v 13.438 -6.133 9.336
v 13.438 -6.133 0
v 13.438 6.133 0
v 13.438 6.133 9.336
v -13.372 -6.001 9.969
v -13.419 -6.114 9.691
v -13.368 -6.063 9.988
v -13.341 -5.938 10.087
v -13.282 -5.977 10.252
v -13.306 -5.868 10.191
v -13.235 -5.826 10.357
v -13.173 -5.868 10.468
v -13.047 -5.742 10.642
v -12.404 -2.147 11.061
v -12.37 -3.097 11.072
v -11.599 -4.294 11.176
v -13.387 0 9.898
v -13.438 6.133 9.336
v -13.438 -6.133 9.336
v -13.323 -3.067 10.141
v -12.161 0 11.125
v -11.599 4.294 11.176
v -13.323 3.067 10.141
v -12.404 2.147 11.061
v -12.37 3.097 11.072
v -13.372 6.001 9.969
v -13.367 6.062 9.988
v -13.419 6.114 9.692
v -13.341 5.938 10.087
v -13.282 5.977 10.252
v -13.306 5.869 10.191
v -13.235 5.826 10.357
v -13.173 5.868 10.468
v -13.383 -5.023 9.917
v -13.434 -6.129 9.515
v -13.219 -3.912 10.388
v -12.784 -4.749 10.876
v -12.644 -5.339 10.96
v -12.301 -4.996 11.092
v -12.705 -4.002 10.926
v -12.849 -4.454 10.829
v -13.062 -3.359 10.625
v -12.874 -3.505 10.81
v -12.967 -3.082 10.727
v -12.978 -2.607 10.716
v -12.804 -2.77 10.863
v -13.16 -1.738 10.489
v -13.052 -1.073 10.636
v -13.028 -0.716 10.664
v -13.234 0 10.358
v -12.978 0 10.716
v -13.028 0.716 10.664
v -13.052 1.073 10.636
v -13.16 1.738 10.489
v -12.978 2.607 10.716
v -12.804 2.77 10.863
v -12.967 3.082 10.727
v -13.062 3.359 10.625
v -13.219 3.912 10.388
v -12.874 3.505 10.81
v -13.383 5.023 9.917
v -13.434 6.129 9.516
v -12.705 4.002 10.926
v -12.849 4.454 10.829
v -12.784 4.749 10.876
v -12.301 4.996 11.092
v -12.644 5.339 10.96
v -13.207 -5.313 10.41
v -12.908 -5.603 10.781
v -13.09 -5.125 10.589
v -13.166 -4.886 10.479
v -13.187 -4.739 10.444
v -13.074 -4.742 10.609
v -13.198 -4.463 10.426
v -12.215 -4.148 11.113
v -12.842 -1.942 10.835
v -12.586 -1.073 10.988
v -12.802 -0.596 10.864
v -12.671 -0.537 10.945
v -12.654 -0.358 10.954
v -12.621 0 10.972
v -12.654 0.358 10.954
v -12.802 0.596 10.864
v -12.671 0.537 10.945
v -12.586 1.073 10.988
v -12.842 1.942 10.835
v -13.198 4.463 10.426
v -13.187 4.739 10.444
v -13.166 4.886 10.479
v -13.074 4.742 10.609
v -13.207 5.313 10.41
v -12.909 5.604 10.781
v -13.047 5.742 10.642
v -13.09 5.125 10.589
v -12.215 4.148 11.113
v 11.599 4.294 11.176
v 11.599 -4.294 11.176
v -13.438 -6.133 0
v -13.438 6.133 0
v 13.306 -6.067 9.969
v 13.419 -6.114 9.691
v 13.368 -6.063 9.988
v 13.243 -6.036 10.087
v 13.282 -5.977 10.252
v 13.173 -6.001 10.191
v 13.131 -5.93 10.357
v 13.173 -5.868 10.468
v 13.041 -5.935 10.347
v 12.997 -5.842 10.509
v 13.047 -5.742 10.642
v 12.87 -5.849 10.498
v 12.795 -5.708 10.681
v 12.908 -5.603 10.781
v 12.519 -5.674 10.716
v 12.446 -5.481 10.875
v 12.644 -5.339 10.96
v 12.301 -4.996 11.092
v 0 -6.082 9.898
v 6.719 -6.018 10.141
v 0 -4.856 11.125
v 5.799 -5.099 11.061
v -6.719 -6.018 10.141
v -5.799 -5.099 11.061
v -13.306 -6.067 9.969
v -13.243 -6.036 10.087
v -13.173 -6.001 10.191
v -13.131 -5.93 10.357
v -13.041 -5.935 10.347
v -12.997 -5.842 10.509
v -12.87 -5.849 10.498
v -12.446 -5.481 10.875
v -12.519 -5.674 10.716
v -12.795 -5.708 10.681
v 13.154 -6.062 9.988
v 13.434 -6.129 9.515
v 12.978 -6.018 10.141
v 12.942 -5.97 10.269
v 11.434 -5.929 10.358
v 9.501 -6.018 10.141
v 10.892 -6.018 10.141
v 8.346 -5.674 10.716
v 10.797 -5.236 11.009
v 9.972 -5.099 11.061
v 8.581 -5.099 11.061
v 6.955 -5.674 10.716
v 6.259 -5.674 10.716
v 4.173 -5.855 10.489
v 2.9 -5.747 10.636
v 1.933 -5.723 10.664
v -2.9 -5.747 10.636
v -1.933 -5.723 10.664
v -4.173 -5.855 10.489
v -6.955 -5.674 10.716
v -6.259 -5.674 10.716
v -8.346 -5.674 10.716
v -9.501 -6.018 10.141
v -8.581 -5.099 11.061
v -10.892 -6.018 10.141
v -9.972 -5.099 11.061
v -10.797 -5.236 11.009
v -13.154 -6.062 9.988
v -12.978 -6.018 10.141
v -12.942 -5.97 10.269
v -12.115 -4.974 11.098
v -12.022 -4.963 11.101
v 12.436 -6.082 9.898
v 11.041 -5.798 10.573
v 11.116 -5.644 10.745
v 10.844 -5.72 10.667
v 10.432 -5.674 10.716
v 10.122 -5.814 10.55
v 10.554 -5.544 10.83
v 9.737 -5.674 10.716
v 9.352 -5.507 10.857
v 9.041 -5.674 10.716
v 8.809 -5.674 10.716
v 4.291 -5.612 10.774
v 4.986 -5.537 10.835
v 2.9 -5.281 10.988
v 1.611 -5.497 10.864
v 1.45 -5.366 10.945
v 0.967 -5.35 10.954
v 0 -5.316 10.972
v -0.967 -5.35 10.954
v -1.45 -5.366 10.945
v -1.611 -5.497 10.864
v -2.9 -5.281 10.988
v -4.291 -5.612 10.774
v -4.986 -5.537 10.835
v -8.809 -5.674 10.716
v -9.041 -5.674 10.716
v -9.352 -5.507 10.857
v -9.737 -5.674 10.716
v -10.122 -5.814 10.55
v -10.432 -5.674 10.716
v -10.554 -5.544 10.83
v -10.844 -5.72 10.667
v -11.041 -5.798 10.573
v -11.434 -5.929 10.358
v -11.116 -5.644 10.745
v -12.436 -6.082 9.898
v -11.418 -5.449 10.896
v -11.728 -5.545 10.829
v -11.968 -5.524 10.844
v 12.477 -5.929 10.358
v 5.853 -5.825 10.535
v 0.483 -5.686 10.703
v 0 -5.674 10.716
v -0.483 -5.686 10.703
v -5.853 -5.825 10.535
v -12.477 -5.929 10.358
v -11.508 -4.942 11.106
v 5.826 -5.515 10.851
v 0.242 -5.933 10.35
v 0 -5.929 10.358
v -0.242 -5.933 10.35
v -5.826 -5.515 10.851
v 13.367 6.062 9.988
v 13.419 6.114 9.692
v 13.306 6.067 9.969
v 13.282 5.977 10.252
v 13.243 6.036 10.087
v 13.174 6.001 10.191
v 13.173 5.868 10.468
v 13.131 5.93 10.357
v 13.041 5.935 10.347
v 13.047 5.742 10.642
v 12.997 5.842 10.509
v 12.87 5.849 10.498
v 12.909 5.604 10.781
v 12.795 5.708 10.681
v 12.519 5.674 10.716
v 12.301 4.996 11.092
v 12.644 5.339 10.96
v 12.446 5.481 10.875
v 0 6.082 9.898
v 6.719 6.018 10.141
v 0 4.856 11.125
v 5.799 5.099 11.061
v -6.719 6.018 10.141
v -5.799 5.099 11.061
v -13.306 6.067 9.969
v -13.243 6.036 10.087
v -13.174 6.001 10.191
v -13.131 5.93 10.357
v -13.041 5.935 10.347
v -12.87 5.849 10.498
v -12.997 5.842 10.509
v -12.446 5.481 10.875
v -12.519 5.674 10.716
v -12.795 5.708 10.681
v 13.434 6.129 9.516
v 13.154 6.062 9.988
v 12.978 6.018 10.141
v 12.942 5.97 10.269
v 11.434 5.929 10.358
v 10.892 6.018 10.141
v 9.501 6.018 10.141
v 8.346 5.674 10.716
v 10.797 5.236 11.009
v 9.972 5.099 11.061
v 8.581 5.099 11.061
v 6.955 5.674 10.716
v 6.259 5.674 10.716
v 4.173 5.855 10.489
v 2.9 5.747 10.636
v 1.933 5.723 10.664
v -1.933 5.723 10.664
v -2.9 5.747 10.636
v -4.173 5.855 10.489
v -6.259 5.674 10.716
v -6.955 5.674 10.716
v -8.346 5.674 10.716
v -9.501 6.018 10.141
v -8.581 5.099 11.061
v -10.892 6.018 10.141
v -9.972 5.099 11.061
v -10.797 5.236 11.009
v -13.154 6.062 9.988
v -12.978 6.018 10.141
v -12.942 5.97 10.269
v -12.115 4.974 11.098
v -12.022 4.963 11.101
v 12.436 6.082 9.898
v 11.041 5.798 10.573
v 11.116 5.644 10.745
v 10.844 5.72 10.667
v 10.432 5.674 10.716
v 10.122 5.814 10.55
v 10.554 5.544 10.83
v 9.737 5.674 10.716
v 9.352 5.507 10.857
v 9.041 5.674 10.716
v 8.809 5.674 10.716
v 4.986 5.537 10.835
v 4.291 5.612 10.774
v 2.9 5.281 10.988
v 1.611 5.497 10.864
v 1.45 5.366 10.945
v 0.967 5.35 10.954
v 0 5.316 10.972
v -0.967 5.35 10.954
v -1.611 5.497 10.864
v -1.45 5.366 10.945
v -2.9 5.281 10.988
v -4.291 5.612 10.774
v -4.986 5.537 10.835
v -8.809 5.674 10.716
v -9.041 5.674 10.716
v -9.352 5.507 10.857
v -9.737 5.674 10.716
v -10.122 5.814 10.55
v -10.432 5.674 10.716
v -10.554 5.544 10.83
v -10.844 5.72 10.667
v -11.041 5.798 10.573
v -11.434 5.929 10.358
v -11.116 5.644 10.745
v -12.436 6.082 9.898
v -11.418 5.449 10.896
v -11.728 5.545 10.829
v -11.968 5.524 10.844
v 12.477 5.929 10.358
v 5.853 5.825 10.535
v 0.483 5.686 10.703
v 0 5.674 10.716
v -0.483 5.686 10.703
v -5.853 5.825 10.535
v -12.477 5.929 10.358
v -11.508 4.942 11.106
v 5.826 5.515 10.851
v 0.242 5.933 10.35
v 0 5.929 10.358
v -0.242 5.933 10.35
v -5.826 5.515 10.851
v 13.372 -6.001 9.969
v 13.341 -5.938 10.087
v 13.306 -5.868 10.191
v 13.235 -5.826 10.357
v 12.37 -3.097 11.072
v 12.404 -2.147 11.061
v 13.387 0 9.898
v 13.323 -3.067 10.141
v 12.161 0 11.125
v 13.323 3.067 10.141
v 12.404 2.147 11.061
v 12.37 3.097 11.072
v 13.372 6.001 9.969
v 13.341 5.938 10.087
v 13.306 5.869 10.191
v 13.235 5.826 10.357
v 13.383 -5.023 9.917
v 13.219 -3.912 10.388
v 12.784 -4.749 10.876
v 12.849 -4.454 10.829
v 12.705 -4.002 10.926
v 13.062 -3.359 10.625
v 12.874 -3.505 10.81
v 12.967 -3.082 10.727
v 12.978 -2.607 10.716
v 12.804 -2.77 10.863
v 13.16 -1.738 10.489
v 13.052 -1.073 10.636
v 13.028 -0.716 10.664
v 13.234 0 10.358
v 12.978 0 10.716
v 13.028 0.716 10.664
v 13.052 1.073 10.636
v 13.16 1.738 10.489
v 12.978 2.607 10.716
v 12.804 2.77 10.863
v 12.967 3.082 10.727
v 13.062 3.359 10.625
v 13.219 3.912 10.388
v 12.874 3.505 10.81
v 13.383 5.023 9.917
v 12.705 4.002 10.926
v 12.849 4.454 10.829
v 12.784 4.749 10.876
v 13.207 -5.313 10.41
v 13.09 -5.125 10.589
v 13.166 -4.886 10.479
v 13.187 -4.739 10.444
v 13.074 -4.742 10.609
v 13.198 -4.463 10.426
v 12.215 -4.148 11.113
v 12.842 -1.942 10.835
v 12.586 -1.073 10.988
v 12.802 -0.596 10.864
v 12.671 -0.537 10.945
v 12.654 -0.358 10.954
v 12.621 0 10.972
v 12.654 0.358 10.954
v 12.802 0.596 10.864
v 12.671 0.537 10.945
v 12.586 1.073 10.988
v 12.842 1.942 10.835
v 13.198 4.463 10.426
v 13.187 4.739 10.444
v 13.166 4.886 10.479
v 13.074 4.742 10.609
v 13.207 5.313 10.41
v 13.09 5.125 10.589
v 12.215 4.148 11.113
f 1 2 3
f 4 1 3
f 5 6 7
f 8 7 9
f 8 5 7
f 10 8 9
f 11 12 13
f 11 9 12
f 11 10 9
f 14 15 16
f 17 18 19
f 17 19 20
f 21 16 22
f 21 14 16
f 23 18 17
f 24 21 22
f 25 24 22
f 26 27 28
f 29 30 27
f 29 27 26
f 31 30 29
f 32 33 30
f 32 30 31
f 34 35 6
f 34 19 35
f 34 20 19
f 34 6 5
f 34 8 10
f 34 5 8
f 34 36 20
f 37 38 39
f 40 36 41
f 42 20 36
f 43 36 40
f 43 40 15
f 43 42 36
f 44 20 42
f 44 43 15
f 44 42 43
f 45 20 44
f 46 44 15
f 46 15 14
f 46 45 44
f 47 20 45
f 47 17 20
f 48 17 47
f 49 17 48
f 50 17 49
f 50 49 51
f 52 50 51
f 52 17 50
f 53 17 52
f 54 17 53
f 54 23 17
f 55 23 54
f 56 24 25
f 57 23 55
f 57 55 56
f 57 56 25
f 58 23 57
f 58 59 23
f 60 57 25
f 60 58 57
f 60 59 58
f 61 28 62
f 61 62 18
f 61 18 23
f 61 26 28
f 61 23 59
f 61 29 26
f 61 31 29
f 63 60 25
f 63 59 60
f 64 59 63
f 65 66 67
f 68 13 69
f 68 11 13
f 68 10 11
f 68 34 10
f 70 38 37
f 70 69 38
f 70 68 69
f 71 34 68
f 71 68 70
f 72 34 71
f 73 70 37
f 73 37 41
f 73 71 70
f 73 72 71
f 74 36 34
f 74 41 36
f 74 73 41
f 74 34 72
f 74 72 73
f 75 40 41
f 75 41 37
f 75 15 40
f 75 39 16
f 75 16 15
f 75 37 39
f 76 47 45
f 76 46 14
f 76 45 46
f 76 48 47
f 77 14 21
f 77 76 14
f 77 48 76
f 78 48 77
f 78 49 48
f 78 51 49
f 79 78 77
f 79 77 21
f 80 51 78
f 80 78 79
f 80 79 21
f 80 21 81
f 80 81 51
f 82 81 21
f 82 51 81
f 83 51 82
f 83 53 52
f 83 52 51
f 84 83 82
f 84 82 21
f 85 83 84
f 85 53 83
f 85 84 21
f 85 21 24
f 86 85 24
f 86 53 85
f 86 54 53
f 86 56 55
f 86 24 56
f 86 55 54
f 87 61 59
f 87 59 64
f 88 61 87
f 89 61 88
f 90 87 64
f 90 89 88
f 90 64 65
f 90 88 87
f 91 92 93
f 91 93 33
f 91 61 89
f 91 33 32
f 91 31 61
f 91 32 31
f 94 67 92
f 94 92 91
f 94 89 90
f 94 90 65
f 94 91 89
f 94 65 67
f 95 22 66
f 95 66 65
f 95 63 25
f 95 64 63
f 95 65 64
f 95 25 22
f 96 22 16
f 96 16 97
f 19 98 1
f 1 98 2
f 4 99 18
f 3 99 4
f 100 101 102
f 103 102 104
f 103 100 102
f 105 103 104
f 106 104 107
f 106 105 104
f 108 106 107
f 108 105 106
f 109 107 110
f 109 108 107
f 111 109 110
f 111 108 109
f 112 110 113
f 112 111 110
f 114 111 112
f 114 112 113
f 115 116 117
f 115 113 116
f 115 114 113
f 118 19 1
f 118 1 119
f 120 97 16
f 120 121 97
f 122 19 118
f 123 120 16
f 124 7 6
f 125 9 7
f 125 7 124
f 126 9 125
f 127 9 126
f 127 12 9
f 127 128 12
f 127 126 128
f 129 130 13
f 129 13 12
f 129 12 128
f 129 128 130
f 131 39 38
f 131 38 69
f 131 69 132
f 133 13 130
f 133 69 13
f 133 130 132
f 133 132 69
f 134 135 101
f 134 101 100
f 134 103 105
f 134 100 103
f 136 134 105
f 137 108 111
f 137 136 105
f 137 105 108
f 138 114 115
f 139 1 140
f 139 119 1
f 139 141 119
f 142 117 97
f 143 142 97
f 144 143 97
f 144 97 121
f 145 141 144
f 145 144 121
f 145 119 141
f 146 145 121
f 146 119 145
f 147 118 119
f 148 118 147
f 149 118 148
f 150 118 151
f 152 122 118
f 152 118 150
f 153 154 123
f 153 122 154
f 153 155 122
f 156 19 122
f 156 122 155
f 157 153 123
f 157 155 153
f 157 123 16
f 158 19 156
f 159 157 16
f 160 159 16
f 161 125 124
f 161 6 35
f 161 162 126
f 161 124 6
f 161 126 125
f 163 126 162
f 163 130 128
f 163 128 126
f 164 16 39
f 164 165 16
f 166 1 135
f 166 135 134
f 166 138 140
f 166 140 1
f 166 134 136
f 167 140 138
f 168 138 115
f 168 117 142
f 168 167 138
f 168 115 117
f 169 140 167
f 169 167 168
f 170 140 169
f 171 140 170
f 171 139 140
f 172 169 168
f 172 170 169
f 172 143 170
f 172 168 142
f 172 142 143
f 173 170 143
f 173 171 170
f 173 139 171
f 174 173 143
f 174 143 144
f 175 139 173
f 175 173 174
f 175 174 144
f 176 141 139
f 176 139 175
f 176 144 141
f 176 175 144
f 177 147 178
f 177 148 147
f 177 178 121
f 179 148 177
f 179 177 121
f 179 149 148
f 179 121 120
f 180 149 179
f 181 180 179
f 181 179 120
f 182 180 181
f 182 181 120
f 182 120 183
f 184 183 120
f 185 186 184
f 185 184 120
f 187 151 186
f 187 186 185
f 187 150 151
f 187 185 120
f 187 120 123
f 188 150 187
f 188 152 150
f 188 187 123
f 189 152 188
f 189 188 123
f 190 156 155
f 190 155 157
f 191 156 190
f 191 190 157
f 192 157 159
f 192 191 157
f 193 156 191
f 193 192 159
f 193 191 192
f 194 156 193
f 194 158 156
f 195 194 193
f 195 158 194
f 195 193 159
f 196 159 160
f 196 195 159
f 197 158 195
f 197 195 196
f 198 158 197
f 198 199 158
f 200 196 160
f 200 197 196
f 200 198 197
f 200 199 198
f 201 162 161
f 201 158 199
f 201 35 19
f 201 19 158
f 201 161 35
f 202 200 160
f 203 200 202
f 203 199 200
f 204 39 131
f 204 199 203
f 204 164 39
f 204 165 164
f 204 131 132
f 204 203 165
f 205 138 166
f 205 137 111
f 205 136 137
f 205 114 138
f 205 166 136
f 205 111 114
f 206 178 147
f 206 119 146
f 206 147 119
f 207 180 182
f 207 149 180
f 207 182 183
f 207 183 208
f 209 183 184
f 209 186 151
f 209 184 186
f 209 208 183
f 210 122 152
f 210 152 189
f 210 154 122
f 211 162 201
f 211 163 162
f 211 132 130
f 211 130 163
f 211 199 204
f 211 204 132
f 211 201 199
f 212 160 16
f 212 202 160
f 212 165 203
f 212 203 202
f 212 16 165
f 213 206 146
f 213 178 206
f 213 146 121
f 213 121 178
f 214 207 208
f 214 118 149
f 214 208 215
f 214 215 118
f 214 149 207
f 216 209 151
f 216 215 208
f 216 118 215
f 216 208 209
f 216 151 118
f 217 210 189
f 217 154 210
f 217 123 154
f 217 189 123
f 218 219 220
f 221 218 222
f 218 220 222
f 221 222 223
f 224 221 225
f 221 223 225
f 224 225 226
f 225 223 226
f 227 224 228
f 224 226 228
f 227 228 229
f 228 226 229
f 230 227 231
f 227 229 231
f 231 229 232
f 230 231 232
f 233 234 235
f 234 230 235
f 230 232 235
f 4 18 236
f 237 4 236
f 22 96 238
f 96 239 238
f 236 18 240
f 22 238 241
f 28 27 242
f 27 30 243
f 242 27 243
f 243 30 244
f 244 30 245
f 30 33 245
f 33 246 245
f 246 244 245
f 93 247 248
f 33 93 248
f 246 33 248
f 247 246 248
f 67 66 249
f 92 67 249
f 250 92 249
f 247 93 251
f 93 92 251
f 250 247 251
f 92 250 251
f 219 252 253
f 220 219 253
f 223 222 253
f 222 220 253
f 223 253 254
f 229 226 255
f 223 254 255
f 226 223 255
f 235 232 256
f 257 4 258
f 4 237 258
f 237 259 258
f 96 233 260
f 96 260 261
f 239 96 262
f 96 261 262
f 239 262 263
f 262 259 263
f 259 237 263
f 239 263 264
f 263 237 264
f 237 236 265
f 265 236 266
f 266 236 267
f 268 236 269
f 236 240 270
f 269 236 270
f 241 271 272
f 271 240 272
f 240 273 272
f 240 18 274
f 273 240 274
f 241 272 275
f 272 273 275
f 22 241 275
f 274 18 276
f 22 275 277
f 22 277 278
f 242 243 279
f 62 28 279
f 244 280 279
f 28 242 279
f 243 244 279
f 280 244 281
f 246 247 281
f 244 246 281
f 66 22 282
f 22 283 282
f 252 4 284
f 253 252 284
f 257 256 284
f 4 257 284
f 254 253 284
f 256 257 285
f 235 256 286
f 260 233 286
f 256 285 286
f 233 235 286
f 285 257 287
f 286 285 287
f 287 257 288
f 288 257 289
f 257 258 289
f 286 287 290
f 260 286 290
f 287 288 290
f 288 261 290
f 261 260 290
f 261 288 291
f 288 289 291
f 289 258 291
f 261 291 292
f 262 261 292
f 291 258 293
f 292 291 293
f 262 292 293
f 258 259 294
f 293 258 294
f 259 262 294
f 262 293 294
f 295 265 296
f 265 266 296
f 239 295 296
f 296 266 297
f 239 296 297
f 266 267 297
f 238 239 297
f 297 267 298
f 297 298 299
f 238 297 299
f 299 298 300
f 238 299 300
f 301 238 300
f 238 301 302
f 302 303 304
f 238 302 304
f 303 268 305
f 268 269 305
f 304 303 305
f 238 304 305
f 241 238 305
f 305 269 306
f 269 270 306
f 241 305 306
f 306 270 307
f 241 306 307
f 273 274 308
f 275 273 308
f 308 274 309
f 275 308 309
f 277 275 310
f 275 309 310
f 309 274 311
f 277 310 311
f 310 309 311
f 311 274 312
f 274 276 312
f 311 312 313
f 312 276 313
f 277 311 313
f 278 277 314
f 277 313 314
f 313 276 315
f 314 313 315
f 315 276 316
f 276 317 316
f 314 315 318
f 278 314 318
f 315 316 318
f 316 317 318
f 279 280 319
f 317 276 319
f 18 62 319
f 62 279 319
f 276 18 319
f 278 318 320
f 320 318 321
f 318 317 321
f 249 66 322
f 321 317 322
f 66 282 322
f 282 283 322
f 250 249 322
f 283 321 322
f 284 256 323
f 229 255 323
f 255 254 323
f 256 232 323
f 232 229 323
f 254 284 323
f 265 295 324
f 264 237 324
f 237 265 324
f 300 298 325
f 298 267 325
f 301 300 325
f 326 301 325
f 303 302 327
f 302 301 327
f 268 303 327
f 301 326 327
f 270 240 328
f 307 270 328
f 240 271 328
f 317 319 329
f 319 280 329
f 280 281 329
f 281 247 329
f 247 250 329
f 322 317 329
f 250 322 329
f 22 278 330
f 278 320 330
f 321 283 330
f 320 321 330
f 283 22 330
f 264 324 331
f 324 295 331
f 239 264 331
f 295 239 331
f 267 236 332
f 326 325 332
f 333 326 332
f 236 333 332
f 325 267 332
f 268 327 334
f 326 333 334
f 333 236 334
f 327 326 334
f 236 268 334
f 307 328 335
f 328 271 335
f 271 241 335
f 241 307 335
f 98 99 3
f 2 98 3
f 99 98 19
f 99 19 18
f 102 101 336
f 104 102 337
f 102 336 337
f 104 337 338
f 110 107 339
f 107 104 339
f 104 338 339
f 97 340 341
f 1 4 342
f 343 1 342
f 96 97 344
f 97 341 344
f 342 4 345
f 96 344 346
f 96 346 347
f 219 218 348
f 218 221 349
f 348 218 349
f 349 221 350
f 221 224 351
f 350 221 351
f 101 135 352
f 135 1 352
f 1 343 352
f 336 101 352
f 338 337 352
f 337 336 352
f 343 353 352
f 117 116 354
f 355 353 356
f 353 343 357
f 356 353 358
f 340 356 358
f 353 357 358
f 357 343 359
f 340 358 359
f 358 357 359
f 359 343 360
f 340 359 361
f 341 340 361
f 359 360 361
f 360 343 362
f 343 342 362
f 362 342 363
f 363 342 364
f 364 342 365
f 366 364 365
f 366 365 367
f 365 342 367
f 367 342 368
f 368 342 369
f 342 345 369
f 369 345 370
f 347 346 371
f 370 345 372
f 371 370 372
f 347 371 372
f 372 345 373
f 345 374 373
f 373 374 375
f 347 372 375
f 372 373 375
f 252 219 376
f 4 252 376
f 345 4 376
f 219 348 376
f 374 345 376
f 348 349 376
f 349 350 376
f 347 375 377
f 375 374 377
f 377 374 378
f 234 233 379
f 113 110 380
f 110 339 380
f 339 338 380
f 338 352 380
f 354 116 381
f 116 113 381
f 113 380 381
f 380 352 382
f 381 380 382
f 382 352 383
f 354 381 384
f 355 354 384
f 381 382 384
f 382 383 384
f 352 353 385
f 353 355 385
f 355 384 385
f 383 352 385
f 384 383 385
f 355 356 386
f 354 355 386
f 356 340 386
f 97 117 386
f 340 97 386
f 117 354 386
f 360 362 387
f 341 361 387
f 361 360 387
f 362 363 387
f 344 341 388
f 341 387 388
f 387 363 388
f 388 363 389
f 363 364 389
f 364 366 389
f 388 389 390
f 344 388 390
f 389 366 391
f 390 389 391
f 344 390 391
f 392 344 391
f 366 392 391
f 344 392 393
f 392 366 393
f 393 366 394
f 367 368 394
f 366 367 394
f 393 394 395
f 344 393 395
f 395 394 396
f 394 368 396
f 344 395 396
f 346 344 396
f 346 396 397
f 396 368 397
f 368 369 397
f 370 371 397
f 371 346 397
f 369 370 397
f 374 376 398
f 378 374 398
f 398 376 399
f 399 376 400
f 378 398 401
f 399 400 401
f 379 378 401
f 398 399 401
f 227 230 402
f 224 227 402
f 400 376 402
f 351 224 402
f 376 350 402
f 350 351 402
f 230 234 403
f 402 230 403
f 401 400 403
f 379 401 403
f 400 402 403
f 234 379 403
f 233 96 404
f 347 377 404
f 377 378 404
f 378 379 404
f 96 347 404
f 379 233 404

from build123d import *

# Parameters (mm, degrees)
F0_W        = 26.8767457455
F0_H        = 12.2668221593
F1_DEPTH    = 11.176
F2_T1_DEPTH = 21.4649758319
F2_T3_DEPTH = 36.0748994182


# Not quite as in the source:
# - a fillet or chamfer that OpenCascade refuses, or shapes differently, is made with other operations: its cross-section is extruded or revolved along the edge and cut away or added


with BuildPart() as f1:
    # F0 (on Top) → F1 (new body)
    with BuildSketch(Plane.XY):
        Rectangle(F0_W, F0_H)
    extrude(amount=F1_DEPTH)

    # F2: fillet of radius 1.8396307345 on 4 edges, made by hand

    # F2_s2 → F2_t1 (cut)
    with BuildSketch(Plane.XZ.offset(-10.732487916)):
        with BuildLine():
            add(Edge.make_bspline(
                [(13.4383728728, 9.3363692655), (13.4383728728, 11.176), (11.5987421382, 11.176)],
                knots=[0, 0, 0, 1, 1, 1], degree=2, weights=[1, 1, 1]))
            Line((11.5987421382, 11.176), (13.4383728728, 11.176))
            Line((13.4383728728, 11.176), (13.4383728728, 9.3363692655))
        make_face()
        with BuildLine():
            add(Edge.make_bspline(
                [(-13.4383728728, 9.3363692655), (-13.4383728728, 11.176), (-11.5987421382, 11.176)],
                knots=[0, 0, 0, 1, 1, 1], degree=2, weights=[1, 1, 1]))
            Line((-11.5987421382, 11.176), (-13.4383728728, 11.176))
            Line((-13.4383728728, 11.176), (-13.4383728728, 9.3363692655))
        make_face()
    extrude(amount=F2_T1_DEPTH, mode=Mode.SUBTRACT)

    # F2_s4 → F2_t3 (cut)
    with BuildSketch(Plane.YZ.offset(-18.0374497091)):
        with BuildLine():
            add(Edge.make_bspline(
                [(6.1334110796, 9.3363692655), (6.1334110796, 11.176), (4.2937803451, 11.176)],
                knots=[0, 0, 0, 1, 1, 1], degree=2, weights=[1, 1, 1]))
            Line((4.2937803451, 11.176), (6.1334110796, 11.176))
            Line((6.1334110796, 11.176), (6.1334110796, 9.3363692655))
        make_face()
        with BuildLine():
            add(Edge.make_bspline(
                [(-6.1334110796, 9.3363692655), (-6.1334110796, 11.176), (-4.2937803451, 11.176)],
                knots=[0, 0, 0, 1, 1, 1], degree=2, weights=[1, 1, 1]))
            Line((-4.2937803451, 11.176), (-6.1334110796, 11.176))
            Line((-6.1334110796, 11.176), (-6.1334110796, 9.3363692655))
        make_face()
    extrude(amount=F2_T3_DEPTH, mode=Mode.SUBTRACT)


solid = f1.part
